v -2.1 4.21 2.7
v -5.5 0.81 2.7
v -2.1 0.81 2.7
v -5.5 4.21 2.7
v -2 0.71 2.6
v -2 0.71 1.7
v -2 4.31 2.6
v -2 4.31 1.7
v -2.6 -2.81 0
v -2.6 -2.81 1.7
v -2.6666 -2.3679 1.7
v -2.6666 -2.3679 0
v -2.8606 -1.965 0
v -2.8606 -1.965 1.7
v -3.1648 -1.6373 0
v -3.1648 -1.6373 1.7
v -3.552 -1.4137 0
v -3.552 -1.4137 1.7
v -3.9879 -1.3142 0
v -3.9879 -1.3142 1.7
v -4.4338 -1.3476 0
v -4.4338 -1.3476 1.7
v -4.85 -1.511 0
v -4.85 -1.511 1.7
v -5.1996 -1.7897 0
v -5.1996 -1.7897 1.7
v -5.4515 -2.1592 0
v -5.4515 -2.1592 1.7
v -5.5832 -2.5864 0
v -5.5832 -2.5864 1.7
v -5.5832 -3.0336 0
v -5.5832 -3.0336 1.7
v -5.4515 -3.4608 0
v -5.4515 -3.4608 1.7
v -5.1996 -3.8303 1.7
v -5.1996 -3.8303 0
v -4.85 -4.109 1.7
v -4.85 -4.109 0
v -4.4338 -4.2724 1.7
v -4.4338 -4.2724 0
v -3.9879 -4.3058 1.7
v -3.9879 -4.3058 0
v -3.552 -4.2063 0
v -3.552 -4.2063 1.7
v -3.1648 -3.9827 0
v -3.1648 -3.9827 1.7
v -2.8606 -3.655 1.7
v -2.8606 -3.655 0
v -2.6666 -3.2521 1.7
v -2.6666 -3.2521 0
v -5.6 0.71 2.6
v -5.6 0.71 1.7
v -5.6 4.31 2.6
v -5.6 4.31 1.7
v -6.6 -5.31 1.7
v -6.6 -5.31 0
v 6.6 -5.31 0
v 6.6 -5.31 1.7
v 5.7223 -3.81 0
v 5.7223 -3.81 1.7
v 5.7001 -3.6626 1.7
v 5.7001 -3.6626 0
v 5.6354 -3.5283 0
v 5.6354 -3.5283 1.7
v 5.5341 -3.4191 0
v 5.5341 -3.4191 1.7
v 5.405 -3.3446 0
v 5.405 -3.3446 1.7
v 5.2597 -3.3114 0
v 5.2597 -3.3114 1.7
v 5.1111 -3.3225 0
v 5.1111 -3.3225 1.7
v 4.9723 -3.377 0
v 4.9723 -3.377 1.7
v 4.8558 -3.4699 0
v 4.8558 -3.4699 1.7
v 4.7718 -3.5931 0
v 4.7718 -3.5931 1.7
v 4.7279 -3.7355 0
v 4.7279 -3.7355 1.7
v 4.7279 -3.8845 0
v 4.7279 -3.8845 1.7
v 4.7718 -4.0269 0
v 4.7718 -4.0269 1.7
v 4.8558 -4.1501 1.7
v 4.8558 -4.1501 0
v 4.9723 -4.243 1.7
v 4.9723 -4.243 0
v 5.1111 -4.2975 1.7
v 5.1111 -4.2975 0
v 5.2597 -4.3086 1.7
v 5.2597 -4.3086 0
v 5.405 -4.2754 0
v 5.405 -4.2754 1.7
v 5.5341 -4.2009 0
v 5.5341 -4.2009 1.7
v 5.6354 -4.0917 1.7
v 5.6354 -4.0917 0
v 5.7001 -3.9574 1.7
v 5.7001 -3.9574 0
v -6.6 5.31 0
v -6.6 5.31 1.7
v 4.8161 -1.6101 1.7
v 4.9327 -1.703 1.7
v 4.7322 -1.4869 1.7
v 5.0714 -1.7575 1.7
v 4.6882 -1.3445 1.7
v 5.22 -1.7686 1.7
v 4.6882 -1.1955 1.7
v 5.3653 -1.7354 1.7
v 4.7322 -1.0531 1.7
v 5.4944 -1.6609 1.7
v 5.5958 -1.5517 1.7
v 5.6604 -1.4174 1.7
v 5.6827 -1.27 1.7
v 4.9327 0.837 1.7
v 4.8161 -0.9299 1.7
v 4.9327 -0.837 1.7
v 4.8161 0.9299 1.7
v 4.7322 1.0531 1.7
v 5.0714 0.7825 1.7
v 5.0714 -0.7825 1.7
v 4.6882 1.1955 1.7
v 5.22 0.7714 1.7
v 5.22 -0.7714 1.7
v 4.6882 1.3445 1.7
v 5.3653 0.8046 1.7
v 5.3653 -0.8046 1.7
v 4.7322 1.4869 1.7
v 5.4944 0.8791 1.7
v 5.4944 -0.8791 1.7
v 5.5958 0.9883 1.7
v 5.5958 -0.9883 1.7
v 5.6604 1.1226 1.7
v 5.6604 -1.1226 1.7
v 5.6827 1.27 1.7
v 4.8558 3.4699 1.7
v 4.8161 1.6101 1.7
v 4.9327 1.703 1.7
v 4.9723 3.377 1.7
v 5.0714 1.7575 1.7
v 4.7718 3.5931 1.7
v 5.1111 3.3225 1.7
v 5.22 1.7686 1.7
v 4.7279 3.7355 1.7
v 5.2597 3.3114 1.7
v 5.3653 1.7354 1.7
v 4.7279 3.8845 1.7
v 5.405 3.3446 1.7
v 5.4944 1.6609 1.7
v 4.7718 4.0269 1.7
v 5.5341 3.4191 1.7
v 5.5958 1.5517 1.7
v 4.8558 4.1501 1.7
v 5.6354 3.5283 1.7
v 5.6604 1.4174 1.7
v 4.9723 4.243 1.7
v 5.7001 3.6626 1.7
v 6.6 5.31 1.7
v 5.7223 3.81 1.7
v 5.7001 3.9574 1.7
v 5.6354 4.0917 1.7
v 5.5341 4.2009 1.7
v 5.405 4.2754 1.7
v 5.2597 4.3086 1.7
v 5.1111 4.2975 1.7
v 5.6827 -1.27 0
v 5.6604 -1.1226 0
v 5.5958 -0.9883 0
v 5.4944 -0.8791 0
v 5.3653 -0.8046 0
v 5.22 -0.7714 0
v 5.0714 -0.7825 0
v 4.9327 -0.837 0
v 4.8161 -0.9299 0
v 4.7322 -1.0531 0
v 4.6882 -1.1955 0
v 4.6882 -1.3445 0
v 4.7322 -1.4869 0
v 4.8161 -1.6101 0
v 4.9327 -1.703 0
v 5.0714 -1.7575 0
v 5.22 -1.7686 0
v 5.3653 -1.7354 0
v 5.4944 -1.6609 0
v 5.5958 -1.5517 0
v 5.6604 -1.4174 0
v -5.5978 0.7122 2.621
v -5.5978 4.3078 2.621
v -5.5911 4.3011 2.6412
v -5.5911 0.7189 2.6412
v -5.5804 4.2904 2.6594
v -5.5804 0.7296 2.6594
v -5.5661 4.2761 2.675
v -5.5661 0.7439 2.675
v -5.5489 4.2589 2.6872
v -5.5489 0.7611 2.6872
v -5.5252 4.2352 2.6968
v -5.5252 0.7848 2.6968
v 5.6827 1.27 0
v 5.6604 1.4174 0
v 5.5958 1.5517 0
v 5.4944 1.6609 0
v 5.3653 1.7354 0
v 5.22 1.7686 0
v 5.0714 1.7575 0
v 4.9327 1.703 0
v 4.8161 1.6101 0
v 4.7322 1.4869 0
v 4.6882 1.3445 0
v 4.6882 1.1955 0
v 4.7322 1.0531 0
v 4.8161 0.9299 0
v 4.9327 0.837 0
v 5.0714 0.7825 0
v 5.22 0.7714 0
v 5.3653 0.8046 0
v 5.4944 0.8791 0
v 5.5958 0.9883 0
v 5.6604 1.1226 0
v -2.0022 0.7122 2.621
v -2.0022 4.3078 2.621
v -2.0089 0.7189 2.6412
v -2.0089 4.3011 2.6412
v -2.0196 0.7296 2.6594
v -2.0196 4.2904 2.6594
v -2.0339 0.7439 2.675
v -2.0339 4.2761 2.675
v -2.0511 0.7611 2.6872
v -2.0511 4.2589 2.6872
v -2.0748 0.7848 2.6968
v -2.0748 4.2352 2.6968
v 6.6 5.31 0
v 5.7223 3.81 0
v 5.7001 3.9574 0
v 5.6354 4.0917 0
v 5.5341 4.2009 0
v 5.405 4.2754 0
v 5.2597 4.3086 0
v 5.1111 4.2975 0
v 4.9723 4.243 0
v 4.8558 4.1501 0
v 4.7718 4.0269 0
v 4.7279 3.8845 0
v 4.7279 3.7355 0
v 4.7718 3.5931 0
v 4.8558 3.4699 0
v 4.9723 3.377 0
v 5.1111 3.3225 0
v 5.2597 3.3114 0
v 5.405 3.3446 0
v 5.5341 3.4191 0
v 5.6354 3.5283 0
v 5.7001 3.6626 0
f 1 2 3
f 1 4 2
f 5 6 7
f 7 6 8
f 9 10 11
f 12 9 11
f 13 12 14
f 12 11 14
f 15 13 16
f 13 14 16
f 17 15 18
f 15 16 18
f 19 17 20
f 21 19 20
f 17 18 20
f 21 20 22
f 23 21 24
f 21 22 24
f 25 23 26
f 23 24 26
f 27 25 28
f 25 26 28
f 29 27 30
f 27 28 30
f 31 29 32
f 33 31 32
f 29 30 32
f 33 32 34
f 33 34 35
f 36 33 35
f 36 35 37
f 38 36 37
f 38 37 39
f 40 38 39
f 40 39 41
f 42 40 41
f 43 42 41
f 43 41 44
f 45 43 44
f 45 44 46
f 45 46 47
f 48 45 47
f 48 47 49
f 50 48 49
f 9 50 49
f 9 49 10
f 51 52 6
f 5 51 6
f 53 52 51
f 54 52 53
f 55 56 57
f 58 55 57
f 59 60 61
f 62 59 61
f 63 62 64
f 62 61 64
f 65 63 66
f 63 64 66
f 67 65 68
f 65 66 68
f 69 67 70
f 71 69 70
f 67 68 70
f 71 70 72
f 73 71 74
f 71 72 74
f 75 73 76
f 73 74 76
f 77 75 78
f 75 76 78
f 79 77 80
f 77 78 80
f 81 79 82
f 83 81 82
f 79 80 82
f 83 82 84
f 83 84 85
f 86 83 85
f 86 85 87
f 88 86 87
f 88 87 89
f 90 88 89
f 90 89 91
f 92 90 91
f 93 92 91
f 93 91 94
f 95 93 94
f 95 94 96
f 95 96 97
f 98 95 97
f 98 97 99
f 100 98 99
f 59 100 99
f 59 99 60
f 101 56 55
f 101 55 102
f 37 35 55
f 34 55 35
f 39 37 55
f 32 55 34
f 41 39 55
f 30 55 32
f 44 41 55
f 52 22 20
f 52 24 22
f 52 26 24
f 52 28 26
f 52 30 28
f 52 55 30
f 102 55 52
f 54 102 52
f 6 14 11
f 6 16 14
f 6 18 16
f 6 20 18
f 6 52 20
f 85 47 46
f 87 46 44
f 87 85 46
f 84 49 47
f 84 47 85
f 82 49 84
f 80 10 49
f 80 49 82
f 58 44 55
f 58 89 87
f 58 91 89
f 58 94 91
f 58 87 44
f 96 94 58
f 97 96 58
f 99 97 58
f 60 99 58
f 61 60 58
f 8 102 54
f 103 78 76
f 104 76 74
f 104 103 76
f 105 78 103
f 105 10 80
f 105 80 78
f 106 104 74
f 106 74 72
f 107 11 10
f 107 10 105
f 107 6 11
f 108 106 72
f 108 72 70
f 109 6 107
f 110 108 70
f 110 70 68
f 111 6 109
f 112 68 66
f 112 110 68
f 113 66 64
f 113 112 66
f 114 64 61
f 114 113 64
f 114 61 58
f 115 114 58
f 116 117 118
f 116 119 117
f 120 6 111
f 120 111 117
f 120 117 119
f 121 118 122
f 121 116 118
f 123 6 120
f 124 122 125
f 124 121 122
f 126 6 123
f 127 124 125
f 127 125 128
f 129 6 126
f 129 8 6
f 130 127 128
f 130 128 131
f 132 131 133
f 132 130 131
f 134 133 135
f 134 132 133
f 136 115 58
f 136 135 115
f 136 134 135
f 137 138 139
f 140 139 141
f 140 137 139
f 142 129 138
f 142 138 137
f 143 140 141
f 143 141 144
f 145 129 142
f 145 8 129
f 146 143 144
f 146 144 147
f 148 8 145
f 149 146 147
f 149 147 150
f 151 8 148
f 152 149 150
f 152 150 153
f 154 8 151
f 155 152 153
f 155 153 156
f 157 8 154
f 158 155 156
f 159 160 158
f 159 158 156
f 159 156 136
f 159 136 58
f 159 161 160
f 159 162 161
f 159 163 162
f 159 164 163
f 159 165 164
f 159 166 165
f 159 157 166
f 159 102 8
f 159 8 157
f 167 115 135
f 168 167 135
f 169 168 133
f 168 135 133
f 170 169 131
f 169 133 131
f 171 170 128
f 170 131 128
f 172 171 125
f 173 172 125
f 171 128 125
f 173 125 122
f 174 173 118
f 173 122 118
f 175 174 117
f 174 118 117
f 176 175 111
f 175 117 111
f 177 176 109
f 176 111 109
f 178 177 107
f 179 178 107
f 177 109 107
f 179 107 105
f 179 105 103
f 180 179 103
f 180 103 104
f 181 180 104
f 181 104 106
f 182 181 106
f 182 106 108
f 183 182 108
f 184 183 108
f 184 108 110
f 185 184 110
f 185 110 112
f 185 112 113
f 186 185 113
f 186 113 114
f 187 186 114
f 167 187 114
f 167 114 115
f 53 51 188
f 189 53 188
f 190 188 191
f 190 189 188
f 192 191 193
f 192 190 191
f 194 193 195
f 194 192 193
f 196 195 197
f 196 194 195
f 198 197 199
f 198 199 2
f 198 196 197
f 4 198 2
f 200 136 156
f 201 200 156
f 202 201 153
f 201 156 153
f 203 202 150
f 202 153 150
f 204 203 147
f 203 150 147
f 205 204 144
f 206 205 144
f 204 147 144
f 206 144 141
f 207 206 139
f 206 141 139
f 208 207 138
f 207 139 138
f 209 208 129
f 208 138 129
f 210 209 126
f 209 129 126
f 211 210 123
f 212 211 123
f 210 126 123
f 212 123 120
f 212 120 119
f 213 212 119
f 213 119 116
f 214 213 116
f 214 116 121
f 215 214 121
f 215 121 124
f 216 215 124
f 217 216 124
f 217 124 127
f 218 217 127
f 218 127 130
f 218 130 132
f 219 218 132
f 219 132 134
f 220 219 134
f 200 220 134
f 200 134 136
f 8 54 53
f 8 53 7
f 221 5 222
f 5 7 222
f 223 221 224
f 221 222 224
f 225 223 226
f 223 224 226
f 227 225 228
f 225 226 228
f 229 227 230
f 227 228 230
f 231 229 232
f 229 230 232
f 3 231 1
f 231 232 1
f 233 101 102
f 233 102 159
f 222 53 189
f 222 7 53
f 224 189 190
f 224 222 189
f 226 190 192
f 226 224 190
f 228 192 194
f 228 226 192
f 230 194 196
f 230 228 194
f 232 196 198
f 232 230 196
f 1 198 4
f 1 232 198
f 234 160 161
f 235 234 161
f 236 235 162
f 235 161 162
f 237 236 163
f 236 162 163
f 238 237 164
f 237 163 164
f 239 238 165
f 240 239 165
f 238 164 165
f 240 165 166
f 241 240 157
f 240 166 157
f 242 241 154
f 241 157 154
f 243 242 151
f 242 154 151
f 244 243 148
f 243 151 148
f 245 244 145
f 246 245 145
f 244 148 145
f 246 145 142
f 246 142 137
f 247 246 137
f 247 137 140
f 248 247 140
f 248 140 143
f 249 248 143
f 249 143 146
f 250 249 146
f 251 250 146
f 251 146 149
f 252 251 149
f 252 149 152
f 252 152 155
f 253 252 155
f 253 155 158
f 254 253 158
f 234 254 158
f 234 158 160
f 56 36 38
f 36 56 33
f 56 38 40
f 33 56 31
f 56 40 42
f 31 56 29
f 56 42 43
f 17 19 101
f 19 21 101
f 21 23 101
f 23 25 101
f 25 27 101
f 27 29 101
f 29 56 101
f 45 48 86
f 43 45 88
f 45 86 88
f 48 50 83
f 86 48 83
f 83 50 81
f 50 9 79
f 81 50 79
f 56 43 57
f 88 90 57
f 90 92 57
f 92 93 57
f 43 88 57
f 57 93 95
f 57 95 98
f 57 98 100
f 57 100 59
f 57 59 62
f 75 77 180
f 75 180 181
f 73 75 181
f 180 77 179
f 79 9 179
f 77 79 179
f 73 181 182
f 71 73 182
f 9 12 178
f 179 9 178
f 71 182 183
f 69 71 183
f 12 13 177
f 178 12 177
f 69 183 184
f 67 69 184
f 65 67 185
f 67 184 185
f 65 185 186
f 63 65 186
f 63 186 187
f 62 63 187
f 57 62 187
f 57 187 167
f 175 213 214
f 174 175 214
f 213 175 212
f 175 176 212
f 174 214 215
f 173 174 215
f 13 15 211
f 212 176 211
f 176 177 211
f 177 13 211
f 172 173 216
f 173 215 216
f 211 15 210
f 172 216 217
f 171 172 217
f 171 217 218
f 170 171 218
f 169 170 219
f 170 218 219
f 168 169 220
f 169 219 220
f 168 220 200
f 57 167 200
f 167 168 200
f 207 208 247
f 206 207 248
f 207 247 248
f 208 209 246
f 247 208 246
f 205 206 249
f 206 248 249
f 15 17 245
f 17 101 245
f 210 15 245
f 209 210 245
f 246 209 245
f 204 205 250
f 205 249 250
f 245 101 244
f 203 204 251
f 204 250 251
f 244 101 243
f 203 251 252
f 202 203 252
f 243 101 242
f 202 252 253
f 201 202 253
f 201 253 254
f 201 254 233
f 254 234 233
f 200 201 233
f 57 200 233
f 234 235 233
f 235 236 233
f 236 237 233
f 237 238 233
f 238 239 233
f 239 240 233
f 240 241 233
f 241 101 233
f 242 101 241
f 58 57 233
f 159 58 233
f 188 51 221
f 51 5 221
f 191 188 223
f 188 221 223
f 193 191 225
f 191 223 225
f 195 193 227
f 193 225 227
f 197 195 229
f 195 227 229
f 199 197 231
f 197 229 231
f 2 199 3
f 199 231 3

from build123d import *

# Parameters (mm, degrees)
F0_W     = 13.2
F0_H     = 10.62
F1_DEPTH = 1.7
F2_R     = 0.5
F2_R_2   = 1.5
F3_DEPTH = 1.701
F4_W     = 3.6
F4_H     = 3.6
F5_DEPTH = 1
F6_R     = 0.1


with BuildPart() as f1:
    # F0 (on Top) → F1 (new body)
    with BuildSketch(Plane.XY):
        Rectangle(F0_W, F0_H)
    extrude(amount=F1_DEPTH)

    # F2 (on face) → F3 (cut, through all)
    with BuildSketch(Plane.XY.offset(1.7)):
        with Locations((5.222315, 3.81)):
            Circle(F2_R)
        with Locations((5.182661, 1.27)):
            Circle(F2_R)
        with Locations((5.182661, -1.27)):
            Circle(F2_R)
        with Locations((5.222315, -3.81)):
            Circle(F2_R)
        with Locations((-4.1, -2.81)):
            Circle(F2_R_2)
    extrude(amount=-F3_DEPTH, mode=Mode.SUBTRACT)

    # F4 (on face) → F5 (join)
    with BuildSketch(Plane.XY.offset(1.7)):
        with Locations((-3.8, 2.51)):
            Rectangle(F4_W, F4_H)
    extrude(amount=F5_DEPTH)

    # F6
    f6_edges = [f1.edges().sort_by_distance(p)[0] for p in [
        (-3.8, 0.71, 2.7),
        (-2, 2.51, 2.7),
        (-5.6, 2.51, 2.7),
        (-3.8, 4.31, 2.7),
    ]]
    fillet(f6_edges, radius=F6_R)


solid = f1.part
